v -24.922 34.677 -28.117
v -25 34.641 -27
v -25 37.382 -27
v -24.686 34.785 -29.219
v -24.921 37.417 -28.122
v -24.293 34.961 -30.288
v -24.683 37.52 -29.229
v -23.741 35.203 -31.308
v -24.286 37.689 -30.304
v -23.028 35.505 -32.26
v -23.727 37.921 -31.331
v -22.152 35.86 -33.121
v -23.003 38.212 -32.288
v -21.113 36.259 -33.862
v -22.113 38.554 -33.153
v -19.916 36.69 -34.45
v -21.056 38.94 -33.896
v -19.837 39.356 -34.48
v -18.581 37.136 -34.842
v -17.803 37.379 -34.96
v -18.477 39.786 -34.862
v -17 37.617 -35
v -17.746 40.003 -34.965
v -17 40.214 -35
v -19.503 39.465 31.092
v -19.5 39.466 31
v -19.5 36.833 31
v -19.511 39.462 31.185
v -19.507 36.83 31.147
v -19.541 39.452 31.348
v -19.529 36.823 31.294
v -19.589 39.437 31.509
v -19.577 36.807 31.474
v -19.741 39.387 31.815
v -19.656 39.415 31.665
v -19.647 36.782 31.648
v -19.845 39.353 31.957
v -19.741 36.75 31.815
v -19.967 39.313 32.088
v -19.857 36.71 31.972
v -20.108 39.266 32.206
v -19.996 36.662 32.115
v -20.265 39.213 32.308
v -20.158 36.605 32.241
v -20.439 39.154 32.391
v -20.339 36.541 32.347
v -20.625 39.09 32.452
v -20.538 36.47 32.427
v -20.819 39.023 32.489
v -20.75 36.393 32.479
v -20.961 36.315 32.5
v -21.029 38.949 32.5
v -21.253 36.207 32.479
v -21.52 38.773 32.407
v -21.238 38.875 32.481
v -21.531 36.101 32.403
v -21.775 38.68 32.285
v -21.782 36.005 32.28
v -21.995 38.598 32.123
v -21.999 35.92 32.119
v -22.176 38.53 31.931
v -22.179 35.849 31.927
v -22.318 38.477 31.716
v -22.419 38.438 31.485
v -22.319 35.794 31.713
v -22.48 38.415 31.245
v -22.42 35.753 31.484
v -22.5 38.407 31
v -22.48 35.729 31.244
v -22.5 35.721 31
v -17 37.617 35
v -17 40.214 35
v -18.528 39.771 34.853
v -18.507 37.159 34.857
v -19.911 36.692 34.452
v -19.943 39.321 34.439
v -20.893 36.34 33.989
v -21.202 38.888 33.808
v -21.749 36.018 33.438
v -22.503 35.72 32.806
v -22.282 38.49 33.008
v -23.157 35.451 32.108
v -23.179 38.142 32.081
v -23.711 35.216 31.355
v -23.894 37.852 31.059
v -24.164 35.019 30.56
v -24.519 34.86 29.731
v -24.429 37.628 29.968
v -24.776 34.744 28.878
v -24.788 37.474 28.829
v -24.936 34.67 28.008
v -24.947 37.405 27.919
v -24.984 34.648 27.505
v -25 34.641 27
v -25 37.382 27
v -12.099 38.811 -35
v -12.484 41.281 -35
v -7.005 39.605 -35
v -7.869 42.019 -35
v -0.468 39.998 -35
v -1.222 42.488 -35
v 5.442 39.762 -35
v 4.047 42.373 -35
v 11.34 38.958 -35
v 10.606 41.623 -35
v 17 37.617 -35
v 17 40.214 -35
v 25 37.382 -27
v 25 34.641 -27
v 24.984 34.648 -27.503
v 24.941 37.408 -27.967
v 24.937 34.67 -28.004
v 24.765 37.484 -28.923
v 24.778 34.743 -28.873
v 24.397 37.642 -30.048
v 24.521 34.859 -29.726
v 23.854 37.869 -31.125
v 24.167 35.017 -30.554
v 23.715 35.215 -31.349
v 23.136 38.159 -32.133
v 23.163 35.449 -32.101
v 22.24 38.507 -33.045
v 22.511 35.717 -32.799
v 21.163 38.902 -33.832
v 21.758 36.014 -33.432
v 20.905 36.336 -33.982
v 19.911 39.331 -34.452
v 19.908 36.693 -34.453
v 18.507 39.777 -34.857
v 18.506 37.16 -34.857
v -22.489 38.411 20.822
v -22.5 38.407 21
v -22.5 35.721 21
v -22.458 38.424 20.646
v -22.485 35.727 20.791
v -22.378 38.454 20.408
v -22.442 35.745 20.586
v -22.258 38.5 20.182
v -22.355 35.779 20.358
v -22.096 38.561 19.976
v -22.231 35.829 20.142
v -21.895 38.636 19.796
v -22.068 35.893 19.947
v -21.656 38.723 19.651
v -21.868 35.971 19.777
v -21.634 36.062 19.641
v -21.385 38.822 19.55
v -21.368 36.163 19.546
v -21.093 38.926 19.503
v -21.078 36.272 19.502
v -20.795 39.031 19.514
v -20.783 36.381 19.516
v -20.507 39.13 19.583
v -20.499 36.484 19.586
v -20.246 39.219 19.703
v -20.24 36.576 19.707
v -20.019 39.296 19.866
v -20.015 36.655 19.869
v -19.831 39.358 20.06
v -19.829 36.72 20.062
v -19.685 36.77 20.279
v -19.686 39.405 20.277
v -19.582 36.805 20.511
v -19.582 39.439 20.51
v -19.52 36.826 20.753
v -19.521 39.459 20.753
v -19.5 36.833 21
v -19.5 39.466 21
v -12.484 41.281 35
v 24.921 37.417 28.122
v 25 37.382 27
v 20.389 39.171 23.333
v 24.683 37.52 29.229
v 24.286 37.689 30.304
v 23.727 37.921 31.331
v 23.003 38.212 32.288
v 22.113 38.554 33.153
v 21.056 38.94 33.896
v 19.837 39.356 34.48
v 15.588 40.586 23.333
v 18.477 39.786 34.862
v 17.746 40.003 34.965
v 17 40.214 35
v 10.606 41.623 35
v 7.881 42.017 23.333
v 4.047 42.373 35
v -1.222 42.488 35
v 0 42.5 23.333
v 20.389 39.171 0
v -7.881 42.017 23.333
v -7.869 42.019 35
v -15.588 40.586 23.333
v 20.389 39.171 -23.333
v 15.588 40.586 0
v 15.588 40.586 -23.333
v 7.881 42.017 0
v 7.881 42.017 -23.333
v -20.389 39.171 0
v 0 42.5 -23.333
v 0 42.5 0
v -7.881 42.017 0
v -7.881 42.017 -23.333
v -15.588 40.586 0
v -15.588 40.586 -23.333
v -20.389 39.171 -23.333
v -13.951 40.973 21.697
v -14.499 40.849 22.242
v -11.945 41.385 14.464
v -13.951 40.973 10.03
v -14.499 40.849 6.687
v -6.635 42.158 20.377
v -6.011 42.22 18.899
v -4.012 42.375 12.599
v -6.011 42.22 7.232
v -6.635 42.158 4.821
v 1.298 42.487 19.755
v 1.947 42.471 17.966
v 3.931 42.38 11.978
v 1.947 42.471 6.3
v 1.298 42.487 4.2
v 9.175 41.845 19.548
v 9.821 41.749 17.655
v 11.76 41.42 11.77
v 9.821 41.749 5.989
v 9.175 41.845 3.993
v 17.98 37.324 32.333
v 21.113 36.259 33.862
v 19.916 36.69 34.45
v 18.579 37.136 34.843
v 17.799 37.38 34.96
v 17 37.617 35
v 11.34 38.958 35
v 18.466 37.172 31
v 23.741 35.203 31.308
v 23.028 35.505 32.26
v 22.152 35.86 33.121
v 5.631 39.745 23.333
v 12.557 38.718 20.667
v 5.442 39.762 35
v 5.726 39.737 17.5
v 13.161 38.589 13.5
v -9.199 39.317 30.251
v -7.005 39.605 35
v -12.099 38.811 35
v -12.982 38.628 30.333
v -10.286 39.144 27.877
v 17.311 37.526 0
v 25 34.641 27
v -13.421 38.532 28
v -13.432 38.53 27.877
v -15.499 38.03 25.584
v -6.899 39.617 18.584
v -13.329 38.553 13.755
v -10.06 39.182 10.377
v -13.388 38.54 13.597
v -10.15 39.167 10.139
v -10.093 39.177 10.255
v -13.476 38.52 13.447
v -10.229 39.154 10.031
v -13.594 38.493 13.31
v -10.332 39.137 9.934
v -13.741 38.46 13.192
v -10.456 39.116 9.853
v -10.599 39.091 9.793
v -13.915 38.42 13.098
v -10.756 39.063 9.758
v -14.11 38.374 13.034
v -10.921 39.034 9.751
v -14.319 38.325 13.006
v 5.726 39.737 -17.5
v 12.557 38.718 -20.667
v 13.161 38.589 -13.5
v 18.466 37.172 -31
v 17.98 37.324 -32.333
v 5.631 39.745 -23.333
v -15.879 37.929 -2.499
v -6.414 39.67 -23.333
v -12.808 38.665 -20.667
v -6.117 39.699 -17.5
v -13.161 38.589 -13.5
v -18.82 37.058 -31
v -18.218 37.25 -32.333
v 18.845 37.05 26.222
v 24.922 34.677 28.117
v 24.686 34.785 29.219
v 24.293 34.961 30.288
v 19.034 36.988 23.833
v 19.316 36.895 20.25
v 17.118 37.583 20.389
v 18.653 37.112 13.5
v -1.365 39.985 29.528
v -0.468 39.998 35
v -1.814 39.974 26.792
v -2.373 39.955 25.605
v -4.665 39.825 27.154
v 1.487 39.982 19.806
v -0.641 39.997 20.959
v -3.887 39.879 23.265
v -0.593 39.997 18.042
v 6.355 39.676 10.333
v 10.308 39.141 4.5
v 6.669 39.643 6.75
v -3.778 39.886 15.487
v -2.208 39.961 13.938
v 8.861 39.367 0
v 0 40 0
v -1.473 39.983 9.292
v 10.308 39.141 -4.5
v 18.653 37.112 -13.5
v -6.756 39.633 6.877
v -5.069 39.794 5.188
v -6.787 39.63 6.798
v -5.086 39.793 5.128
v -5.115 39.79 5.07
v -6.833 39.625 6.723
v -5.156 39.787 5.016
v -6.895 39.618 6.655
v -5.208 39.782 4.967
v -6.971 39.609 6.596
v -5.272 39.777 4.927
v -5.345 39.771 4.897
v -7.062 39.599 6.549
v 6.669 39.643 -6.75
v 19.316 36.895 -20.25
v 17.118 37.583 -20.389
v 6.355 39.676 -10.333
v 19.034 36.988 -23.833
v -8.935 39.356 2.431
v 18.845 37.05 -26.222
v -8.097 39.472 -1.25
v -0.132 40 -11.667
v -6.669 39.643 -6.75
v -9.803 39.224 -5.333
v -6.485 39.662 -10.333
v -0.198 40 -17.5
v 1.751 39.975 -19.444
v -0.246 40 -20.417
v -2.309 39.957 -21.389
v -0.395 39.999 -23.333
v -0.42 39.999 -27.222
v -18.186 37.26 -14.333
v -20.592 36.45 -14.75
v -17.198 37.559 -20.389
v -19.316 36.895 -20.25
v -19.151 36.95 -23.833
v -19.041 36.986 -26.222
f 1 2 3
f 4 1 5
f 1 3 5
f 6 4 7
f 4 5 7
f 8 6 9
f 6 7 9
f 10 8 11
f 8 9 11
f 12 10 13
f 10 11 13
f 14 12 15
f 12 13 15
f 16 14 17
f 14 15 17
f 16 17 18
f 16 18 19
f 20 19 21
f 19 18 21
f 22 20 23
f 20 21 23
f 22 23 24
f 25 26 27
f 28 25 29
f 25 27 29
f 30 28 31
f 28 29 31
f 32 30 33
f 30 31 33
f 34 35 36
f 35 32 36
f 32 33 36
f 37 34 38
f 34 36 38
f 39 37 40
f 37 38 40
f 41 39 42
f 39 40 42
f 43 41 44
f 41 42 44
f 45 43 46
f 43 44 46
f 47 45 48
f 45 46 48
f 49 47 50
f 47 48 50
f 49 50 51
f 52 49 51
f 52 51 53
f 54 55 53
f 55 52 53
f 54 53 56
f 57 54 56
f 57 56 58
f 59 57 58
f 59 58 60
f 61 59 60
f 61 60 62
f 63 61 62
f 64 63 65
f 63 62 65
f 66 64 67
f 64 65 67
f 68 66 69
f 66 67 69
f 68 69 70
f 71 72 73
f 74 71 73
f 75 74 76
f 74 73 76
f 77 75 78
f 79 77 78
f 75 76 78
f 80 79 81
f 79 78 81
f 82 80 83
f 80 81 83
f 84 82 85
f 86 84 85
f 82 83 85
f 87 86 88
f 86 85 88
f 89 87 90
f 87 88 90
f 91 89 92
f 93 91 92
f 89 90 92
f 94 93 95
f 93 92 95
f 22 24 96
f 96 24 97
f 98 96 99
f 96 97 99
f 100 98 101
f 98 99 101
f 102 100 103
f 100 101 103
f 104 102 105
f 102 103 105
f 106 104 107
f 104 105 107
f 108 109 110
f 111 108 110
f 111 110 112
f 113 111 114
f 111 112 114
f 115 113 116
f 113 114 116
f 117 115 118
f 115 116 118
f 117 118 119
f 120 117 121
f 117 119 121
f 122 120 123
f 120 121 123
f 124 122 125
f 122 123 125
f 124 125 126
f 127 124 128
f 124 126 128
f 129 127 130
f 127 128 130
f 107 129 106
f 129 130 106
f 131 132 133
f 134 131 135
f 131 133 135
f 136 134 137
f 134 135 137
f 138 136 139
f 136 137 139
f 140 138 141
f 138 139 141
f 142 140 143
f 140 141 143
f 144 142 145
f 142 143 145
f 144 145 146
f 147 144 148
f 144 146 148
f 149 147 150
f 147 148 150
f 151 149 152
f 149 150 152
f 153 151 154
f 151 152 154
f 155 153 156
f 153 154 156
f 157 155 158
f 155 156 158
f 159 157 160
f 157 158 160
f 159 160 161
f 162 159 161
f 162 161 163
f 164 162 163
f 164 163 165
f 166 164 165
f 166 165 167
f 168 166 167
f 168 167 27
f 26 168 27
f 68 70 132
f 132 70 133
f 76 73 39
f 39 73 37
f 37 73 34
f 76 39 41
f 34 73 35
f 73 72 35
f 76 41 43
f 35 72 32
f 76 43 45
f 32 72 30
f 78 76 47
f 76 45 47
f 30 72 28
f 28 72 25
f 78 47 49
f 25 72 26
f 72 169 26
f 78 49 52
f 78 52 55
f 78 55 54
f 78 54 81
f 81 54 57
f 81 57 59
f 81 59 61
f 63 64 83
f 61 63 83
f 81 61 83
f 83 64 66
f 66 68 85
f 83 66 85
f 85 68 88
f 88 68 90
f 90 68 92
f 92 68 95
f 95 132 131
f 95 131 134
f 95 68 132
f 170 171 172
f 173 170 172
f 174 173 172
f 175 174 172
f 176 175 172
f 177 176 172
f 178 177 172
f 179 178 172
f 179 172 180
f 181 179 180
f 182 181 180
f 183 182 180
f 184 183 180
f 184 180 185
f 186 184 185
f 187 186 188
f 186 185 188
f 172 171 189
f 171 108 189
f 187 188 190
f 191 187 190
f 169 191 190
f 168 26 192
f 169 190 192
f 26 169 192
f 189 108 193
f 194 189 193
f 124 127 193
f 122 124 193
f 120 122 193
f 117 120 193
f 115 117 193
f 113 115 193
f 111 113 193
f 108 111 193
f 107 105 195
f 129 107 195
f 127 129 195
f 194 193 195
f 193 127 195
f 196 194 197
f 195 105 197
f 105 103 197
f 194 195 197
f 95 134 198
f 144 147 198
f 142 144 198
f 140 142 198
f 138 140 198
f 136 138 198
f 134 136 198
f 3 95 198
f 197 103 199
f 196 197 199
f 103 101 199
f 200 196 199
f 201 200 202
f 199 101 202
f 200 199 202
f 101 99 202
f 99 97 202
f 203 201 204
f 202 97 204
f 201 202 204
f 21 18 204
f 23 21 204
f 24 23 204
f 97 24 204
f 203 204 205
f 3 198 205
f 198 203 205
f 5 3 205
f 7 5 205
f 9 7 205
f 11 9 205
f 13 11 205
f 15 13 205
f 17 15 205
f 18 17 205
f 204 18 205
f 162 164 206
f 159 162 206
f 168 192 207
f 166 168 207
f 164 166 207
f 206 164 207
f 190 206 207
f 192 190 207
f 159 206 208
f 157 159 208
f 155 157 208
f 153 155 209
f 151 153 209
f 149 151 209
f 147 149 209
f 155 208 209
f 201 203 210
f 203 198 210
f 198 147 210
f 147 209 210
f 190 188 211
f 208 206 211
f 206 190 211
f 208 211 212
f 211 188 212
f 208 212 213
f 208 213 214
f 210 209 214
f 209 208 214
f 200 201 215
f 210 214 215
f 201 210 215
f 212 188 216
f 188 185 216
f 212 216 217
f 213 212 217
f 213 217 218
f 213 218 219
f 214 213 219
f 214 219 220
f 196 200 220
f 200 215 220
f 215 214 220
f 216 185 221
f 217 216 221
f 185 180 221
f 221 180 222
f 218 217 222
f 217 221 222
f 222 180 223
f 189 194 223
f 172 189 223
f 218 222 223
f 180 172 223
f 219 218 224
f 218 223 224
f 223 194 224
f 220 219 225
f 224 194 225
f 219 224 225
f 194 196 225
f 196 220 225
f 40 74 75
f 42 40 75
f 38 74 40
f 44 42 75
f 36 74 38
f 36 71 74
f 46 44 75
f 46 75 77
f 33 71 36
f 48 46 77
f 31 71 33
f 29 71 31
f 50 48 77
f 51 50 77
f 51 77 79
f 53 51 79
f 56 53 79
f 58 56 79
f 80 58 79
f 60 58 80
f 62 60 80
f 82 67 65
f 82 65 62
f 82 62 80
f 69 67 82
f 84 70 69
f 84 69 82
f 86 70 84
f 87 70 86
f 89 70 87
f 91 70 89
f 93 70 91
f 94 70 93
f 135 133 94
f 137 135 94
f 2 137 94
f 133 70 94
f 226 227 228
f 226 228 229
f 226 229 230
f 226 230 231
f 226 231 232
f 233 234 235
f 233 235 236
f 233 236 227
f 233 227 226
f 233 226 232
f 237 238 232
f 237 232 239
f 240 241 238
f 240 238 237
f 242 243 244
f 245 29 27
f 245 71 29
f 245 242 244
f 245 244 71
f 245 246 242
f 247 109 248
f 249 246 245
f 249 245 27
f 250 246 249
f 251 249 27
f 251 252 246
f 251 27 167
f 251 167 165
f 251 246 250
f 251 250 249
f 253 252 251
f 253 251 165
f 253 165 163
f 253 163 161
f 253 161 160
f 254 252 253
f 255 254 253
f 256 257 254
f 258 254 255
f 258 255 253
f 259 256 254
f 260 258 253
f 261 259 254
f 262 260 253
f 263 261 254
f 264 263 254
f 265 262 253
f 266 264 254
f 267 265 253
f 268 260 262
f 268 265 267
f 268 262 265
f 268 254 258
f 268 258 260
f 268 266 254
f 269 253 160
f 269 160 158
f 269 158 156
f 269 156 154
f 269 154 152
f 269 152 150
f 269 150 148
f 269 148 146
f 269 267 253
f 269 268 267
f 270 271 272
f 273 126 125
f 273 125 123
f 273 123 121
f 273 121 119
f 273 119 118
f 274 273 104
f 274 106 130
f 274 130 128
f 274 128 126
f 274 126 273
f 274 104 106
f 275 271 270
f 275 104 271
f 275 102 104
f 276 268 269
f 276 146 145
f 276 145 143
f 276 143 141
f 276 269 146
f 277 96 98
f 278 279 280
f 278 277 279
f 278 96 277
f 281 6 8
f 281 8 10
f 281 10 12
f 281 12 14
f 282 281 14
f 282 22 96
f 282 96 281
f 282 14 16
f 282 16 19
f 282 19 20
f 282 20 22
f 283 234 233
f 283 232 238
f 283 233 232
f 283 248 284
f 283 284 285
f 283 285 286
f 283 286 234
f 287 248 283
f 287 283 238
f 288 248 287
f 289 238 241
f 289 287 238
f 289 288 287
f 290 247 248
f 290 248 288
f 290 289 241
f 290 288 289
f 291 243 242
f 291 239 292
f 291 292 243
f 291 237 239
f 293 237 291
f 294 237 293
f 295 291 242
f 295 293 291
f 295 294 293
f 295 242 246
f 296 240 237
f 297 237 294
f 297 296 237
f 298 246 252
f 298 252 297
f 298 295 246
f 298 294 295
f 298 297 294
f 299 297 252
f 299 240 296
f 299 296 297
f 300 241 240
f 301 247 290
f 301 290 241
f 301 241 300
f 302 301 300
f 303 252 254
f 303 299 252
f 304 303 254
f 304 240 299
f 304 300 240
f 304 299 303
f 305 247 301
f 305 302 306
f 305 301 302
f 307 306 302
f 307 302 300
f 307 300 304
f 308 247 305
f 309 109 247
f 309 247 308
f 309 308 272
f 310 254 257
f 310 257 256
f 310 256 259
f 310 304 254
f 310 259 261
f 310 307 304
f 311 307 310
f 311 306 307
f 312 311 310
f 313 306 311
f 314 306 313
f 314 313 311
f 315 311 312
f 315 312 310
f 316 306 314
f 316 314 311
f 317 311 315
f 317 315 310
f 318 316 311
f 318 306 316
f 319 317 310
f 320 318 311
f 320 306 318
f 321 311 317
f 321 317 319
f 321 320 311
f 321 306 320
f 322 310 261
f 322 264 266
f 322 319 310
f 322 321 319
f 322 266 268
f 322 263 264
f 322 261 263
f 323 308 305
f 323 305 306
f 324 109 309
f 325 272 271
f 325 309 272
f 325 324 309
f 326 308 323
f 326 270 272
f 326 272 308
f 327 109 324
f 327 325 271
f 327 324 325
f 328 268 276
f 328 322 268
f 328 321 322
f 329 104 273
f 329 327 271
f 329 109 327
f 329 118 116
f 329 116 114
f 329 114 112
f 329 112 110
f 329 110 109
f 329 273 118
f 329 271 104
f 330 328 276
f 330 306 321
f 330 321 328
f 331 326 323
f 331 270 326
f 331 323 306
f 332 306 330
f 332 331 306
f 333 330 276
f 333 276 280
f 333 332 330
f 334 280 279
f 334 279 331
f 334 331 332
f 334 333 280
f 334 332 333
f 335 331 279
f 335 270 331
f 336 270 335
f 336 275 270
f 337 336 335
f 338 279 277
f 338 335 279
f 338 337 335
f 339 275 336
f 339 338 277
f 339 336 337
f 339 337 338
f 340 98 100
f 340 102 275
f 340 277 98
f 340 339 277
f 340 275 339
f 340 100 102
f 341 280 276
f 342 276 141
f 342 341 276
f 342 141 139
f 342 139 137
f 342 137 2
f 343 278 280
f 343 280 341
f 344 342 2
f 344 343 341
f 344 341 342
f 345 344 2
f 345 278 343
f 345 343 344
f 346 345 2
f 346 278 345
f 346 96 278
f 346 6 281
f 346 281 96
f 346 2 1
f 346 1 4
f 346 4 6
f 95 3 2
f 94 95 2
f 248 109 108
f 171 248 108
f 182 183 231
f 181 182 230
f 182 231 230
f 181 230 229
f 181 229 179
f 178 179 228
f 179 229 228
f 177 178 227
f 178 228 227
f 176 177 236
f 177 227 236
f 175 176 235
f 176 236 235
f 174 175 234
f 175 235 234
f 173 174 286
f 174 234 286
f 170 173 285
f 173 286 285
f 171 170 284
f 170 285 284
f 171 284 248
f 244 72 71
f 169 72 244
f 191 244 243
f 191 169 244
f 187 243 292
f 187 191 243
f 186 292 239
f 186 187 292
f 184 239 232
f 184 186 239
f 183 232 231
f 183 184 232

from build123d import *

# Parameters (mm, degrees)
BOSS_EXTRUDE1_START = -35
BOSS_EXTRUDE1_DEPTH = 70
CUT_EXTRUDE1_DEPTH  = 61.466933282
FILLET1_R           = 8


# Read off the part's stored shape, not the designer's step: Boss-Extrude1
with BuildPart() as part:
    # Boss-Extrude1 outline → Boss-Extrude1 (new body)
    with BuildSketch(Plane.XY.offset(BOSS_EXTRUDE1_START)):
        with BuildLine():
            Line((25, 34.641016151), (25, 37.382028889))
            add(Edge.make_bspline(
                [(25, 37.382028889), (23.499149868, 38.038900322), (20.42020332, 39.233525172), (12.247727699, 41.641473317), (0, 43.149082804), (-12.247727699, 41.641473317), (-20.42020332, 39.233525172), (-23.499149868, 38.038900322), (-25, 37.382028889)],
                knots=[1.070195568, 1.070195568, 1.070195568, 1.070195568, 1.168370339, 1.266545109, 1.570796327, 1.875047544, 1.973222315, 2.071397085, 2.071397085, 2.071397085, 2.071397085], degree=3))
            Line((-25, 37.382028889), (-25, 34.641016151))
            add(Edge.make_bspline(
                [(25, 34.641016151), (0, 46.188021535), (-25, 34.641016151)],
                knots=[1.047197551, 1.047197551, 1.047197551, 2.094395102, 2.094395102, 2.094395102], degree=2, weights=[1, 0.866025404, 1]))
        make_face()
    extrude(amount=BOSS_EXTRUDE1_DEPTH)

    # Sketch5 → Cut-Extrude1 (cut, through all)
    with BuildSketch(Plane(origin=(0, 0, 0), x_dir=(1, 0, 0), z_dir=(0, 1, 0))):
        with BuildLine():
            Line((-22.5, -31), (-22.5, -21))
            ThreePointArc((-22.5, -21), (-21, -19.5), (-19.5, -21))
            Line((-19.5, -21), (-19.5, -31))
            ThreePointArc((-19.5, -31), (-21, -32.5), (-22.5, -31))
        make_face()
    extrude(amount=CUT_EXTRUDE1_DEPTH, mode=Mode.SUBTRACT)

    # Fillet1
    # the kernel refuses this fillet: 8 mm, written as the material it takes off along each edge
    with BuildSketch(Plane(origin=(-25, 57.382028889, -35), x_dir=(1, 0, 0), z_dir=(0, -1, 0)), Plane(origin=(25, 14.641016151, 35), x_dir=(0, 0, -1), z_dir=(0, 1, 0))) as fillet1_piece_1:
        with BuildLine():
            CenterArc((FILLET1_R, FILLET1_R), FILLET1_R, 180, 90)
            Line((0, FILLET1_R), (0, 0))
            Line((0, 0), (FILLET1_R, 0))
        make_face()
    extrude(amount=42.741012738, mode=Mode.SUBTRACT)
    with BuildSketch(Plane(origin=(-25, 57.382028889, 35), x_dir=(1, 0, 0), z_dir=(0, -1, 0)), Plane(origin=(25, 14.641016151, -35), x_dir=(0, 0, 1), z_dir=(0, 1, 0))) as fillet1_piece_2:
        with BuildLine():
            CenterArc((FILLET1_R, -FILLET1_R), FILLET1_R, 90, 90)
            Line((0, -FILLET1_R), (0, 0))
            Line((0, 0), (FILLET1_R, 0))
        make_face()
    extrude(amount=42.741012738, mode=Mode.SUBTRACT)


solid = part.part
